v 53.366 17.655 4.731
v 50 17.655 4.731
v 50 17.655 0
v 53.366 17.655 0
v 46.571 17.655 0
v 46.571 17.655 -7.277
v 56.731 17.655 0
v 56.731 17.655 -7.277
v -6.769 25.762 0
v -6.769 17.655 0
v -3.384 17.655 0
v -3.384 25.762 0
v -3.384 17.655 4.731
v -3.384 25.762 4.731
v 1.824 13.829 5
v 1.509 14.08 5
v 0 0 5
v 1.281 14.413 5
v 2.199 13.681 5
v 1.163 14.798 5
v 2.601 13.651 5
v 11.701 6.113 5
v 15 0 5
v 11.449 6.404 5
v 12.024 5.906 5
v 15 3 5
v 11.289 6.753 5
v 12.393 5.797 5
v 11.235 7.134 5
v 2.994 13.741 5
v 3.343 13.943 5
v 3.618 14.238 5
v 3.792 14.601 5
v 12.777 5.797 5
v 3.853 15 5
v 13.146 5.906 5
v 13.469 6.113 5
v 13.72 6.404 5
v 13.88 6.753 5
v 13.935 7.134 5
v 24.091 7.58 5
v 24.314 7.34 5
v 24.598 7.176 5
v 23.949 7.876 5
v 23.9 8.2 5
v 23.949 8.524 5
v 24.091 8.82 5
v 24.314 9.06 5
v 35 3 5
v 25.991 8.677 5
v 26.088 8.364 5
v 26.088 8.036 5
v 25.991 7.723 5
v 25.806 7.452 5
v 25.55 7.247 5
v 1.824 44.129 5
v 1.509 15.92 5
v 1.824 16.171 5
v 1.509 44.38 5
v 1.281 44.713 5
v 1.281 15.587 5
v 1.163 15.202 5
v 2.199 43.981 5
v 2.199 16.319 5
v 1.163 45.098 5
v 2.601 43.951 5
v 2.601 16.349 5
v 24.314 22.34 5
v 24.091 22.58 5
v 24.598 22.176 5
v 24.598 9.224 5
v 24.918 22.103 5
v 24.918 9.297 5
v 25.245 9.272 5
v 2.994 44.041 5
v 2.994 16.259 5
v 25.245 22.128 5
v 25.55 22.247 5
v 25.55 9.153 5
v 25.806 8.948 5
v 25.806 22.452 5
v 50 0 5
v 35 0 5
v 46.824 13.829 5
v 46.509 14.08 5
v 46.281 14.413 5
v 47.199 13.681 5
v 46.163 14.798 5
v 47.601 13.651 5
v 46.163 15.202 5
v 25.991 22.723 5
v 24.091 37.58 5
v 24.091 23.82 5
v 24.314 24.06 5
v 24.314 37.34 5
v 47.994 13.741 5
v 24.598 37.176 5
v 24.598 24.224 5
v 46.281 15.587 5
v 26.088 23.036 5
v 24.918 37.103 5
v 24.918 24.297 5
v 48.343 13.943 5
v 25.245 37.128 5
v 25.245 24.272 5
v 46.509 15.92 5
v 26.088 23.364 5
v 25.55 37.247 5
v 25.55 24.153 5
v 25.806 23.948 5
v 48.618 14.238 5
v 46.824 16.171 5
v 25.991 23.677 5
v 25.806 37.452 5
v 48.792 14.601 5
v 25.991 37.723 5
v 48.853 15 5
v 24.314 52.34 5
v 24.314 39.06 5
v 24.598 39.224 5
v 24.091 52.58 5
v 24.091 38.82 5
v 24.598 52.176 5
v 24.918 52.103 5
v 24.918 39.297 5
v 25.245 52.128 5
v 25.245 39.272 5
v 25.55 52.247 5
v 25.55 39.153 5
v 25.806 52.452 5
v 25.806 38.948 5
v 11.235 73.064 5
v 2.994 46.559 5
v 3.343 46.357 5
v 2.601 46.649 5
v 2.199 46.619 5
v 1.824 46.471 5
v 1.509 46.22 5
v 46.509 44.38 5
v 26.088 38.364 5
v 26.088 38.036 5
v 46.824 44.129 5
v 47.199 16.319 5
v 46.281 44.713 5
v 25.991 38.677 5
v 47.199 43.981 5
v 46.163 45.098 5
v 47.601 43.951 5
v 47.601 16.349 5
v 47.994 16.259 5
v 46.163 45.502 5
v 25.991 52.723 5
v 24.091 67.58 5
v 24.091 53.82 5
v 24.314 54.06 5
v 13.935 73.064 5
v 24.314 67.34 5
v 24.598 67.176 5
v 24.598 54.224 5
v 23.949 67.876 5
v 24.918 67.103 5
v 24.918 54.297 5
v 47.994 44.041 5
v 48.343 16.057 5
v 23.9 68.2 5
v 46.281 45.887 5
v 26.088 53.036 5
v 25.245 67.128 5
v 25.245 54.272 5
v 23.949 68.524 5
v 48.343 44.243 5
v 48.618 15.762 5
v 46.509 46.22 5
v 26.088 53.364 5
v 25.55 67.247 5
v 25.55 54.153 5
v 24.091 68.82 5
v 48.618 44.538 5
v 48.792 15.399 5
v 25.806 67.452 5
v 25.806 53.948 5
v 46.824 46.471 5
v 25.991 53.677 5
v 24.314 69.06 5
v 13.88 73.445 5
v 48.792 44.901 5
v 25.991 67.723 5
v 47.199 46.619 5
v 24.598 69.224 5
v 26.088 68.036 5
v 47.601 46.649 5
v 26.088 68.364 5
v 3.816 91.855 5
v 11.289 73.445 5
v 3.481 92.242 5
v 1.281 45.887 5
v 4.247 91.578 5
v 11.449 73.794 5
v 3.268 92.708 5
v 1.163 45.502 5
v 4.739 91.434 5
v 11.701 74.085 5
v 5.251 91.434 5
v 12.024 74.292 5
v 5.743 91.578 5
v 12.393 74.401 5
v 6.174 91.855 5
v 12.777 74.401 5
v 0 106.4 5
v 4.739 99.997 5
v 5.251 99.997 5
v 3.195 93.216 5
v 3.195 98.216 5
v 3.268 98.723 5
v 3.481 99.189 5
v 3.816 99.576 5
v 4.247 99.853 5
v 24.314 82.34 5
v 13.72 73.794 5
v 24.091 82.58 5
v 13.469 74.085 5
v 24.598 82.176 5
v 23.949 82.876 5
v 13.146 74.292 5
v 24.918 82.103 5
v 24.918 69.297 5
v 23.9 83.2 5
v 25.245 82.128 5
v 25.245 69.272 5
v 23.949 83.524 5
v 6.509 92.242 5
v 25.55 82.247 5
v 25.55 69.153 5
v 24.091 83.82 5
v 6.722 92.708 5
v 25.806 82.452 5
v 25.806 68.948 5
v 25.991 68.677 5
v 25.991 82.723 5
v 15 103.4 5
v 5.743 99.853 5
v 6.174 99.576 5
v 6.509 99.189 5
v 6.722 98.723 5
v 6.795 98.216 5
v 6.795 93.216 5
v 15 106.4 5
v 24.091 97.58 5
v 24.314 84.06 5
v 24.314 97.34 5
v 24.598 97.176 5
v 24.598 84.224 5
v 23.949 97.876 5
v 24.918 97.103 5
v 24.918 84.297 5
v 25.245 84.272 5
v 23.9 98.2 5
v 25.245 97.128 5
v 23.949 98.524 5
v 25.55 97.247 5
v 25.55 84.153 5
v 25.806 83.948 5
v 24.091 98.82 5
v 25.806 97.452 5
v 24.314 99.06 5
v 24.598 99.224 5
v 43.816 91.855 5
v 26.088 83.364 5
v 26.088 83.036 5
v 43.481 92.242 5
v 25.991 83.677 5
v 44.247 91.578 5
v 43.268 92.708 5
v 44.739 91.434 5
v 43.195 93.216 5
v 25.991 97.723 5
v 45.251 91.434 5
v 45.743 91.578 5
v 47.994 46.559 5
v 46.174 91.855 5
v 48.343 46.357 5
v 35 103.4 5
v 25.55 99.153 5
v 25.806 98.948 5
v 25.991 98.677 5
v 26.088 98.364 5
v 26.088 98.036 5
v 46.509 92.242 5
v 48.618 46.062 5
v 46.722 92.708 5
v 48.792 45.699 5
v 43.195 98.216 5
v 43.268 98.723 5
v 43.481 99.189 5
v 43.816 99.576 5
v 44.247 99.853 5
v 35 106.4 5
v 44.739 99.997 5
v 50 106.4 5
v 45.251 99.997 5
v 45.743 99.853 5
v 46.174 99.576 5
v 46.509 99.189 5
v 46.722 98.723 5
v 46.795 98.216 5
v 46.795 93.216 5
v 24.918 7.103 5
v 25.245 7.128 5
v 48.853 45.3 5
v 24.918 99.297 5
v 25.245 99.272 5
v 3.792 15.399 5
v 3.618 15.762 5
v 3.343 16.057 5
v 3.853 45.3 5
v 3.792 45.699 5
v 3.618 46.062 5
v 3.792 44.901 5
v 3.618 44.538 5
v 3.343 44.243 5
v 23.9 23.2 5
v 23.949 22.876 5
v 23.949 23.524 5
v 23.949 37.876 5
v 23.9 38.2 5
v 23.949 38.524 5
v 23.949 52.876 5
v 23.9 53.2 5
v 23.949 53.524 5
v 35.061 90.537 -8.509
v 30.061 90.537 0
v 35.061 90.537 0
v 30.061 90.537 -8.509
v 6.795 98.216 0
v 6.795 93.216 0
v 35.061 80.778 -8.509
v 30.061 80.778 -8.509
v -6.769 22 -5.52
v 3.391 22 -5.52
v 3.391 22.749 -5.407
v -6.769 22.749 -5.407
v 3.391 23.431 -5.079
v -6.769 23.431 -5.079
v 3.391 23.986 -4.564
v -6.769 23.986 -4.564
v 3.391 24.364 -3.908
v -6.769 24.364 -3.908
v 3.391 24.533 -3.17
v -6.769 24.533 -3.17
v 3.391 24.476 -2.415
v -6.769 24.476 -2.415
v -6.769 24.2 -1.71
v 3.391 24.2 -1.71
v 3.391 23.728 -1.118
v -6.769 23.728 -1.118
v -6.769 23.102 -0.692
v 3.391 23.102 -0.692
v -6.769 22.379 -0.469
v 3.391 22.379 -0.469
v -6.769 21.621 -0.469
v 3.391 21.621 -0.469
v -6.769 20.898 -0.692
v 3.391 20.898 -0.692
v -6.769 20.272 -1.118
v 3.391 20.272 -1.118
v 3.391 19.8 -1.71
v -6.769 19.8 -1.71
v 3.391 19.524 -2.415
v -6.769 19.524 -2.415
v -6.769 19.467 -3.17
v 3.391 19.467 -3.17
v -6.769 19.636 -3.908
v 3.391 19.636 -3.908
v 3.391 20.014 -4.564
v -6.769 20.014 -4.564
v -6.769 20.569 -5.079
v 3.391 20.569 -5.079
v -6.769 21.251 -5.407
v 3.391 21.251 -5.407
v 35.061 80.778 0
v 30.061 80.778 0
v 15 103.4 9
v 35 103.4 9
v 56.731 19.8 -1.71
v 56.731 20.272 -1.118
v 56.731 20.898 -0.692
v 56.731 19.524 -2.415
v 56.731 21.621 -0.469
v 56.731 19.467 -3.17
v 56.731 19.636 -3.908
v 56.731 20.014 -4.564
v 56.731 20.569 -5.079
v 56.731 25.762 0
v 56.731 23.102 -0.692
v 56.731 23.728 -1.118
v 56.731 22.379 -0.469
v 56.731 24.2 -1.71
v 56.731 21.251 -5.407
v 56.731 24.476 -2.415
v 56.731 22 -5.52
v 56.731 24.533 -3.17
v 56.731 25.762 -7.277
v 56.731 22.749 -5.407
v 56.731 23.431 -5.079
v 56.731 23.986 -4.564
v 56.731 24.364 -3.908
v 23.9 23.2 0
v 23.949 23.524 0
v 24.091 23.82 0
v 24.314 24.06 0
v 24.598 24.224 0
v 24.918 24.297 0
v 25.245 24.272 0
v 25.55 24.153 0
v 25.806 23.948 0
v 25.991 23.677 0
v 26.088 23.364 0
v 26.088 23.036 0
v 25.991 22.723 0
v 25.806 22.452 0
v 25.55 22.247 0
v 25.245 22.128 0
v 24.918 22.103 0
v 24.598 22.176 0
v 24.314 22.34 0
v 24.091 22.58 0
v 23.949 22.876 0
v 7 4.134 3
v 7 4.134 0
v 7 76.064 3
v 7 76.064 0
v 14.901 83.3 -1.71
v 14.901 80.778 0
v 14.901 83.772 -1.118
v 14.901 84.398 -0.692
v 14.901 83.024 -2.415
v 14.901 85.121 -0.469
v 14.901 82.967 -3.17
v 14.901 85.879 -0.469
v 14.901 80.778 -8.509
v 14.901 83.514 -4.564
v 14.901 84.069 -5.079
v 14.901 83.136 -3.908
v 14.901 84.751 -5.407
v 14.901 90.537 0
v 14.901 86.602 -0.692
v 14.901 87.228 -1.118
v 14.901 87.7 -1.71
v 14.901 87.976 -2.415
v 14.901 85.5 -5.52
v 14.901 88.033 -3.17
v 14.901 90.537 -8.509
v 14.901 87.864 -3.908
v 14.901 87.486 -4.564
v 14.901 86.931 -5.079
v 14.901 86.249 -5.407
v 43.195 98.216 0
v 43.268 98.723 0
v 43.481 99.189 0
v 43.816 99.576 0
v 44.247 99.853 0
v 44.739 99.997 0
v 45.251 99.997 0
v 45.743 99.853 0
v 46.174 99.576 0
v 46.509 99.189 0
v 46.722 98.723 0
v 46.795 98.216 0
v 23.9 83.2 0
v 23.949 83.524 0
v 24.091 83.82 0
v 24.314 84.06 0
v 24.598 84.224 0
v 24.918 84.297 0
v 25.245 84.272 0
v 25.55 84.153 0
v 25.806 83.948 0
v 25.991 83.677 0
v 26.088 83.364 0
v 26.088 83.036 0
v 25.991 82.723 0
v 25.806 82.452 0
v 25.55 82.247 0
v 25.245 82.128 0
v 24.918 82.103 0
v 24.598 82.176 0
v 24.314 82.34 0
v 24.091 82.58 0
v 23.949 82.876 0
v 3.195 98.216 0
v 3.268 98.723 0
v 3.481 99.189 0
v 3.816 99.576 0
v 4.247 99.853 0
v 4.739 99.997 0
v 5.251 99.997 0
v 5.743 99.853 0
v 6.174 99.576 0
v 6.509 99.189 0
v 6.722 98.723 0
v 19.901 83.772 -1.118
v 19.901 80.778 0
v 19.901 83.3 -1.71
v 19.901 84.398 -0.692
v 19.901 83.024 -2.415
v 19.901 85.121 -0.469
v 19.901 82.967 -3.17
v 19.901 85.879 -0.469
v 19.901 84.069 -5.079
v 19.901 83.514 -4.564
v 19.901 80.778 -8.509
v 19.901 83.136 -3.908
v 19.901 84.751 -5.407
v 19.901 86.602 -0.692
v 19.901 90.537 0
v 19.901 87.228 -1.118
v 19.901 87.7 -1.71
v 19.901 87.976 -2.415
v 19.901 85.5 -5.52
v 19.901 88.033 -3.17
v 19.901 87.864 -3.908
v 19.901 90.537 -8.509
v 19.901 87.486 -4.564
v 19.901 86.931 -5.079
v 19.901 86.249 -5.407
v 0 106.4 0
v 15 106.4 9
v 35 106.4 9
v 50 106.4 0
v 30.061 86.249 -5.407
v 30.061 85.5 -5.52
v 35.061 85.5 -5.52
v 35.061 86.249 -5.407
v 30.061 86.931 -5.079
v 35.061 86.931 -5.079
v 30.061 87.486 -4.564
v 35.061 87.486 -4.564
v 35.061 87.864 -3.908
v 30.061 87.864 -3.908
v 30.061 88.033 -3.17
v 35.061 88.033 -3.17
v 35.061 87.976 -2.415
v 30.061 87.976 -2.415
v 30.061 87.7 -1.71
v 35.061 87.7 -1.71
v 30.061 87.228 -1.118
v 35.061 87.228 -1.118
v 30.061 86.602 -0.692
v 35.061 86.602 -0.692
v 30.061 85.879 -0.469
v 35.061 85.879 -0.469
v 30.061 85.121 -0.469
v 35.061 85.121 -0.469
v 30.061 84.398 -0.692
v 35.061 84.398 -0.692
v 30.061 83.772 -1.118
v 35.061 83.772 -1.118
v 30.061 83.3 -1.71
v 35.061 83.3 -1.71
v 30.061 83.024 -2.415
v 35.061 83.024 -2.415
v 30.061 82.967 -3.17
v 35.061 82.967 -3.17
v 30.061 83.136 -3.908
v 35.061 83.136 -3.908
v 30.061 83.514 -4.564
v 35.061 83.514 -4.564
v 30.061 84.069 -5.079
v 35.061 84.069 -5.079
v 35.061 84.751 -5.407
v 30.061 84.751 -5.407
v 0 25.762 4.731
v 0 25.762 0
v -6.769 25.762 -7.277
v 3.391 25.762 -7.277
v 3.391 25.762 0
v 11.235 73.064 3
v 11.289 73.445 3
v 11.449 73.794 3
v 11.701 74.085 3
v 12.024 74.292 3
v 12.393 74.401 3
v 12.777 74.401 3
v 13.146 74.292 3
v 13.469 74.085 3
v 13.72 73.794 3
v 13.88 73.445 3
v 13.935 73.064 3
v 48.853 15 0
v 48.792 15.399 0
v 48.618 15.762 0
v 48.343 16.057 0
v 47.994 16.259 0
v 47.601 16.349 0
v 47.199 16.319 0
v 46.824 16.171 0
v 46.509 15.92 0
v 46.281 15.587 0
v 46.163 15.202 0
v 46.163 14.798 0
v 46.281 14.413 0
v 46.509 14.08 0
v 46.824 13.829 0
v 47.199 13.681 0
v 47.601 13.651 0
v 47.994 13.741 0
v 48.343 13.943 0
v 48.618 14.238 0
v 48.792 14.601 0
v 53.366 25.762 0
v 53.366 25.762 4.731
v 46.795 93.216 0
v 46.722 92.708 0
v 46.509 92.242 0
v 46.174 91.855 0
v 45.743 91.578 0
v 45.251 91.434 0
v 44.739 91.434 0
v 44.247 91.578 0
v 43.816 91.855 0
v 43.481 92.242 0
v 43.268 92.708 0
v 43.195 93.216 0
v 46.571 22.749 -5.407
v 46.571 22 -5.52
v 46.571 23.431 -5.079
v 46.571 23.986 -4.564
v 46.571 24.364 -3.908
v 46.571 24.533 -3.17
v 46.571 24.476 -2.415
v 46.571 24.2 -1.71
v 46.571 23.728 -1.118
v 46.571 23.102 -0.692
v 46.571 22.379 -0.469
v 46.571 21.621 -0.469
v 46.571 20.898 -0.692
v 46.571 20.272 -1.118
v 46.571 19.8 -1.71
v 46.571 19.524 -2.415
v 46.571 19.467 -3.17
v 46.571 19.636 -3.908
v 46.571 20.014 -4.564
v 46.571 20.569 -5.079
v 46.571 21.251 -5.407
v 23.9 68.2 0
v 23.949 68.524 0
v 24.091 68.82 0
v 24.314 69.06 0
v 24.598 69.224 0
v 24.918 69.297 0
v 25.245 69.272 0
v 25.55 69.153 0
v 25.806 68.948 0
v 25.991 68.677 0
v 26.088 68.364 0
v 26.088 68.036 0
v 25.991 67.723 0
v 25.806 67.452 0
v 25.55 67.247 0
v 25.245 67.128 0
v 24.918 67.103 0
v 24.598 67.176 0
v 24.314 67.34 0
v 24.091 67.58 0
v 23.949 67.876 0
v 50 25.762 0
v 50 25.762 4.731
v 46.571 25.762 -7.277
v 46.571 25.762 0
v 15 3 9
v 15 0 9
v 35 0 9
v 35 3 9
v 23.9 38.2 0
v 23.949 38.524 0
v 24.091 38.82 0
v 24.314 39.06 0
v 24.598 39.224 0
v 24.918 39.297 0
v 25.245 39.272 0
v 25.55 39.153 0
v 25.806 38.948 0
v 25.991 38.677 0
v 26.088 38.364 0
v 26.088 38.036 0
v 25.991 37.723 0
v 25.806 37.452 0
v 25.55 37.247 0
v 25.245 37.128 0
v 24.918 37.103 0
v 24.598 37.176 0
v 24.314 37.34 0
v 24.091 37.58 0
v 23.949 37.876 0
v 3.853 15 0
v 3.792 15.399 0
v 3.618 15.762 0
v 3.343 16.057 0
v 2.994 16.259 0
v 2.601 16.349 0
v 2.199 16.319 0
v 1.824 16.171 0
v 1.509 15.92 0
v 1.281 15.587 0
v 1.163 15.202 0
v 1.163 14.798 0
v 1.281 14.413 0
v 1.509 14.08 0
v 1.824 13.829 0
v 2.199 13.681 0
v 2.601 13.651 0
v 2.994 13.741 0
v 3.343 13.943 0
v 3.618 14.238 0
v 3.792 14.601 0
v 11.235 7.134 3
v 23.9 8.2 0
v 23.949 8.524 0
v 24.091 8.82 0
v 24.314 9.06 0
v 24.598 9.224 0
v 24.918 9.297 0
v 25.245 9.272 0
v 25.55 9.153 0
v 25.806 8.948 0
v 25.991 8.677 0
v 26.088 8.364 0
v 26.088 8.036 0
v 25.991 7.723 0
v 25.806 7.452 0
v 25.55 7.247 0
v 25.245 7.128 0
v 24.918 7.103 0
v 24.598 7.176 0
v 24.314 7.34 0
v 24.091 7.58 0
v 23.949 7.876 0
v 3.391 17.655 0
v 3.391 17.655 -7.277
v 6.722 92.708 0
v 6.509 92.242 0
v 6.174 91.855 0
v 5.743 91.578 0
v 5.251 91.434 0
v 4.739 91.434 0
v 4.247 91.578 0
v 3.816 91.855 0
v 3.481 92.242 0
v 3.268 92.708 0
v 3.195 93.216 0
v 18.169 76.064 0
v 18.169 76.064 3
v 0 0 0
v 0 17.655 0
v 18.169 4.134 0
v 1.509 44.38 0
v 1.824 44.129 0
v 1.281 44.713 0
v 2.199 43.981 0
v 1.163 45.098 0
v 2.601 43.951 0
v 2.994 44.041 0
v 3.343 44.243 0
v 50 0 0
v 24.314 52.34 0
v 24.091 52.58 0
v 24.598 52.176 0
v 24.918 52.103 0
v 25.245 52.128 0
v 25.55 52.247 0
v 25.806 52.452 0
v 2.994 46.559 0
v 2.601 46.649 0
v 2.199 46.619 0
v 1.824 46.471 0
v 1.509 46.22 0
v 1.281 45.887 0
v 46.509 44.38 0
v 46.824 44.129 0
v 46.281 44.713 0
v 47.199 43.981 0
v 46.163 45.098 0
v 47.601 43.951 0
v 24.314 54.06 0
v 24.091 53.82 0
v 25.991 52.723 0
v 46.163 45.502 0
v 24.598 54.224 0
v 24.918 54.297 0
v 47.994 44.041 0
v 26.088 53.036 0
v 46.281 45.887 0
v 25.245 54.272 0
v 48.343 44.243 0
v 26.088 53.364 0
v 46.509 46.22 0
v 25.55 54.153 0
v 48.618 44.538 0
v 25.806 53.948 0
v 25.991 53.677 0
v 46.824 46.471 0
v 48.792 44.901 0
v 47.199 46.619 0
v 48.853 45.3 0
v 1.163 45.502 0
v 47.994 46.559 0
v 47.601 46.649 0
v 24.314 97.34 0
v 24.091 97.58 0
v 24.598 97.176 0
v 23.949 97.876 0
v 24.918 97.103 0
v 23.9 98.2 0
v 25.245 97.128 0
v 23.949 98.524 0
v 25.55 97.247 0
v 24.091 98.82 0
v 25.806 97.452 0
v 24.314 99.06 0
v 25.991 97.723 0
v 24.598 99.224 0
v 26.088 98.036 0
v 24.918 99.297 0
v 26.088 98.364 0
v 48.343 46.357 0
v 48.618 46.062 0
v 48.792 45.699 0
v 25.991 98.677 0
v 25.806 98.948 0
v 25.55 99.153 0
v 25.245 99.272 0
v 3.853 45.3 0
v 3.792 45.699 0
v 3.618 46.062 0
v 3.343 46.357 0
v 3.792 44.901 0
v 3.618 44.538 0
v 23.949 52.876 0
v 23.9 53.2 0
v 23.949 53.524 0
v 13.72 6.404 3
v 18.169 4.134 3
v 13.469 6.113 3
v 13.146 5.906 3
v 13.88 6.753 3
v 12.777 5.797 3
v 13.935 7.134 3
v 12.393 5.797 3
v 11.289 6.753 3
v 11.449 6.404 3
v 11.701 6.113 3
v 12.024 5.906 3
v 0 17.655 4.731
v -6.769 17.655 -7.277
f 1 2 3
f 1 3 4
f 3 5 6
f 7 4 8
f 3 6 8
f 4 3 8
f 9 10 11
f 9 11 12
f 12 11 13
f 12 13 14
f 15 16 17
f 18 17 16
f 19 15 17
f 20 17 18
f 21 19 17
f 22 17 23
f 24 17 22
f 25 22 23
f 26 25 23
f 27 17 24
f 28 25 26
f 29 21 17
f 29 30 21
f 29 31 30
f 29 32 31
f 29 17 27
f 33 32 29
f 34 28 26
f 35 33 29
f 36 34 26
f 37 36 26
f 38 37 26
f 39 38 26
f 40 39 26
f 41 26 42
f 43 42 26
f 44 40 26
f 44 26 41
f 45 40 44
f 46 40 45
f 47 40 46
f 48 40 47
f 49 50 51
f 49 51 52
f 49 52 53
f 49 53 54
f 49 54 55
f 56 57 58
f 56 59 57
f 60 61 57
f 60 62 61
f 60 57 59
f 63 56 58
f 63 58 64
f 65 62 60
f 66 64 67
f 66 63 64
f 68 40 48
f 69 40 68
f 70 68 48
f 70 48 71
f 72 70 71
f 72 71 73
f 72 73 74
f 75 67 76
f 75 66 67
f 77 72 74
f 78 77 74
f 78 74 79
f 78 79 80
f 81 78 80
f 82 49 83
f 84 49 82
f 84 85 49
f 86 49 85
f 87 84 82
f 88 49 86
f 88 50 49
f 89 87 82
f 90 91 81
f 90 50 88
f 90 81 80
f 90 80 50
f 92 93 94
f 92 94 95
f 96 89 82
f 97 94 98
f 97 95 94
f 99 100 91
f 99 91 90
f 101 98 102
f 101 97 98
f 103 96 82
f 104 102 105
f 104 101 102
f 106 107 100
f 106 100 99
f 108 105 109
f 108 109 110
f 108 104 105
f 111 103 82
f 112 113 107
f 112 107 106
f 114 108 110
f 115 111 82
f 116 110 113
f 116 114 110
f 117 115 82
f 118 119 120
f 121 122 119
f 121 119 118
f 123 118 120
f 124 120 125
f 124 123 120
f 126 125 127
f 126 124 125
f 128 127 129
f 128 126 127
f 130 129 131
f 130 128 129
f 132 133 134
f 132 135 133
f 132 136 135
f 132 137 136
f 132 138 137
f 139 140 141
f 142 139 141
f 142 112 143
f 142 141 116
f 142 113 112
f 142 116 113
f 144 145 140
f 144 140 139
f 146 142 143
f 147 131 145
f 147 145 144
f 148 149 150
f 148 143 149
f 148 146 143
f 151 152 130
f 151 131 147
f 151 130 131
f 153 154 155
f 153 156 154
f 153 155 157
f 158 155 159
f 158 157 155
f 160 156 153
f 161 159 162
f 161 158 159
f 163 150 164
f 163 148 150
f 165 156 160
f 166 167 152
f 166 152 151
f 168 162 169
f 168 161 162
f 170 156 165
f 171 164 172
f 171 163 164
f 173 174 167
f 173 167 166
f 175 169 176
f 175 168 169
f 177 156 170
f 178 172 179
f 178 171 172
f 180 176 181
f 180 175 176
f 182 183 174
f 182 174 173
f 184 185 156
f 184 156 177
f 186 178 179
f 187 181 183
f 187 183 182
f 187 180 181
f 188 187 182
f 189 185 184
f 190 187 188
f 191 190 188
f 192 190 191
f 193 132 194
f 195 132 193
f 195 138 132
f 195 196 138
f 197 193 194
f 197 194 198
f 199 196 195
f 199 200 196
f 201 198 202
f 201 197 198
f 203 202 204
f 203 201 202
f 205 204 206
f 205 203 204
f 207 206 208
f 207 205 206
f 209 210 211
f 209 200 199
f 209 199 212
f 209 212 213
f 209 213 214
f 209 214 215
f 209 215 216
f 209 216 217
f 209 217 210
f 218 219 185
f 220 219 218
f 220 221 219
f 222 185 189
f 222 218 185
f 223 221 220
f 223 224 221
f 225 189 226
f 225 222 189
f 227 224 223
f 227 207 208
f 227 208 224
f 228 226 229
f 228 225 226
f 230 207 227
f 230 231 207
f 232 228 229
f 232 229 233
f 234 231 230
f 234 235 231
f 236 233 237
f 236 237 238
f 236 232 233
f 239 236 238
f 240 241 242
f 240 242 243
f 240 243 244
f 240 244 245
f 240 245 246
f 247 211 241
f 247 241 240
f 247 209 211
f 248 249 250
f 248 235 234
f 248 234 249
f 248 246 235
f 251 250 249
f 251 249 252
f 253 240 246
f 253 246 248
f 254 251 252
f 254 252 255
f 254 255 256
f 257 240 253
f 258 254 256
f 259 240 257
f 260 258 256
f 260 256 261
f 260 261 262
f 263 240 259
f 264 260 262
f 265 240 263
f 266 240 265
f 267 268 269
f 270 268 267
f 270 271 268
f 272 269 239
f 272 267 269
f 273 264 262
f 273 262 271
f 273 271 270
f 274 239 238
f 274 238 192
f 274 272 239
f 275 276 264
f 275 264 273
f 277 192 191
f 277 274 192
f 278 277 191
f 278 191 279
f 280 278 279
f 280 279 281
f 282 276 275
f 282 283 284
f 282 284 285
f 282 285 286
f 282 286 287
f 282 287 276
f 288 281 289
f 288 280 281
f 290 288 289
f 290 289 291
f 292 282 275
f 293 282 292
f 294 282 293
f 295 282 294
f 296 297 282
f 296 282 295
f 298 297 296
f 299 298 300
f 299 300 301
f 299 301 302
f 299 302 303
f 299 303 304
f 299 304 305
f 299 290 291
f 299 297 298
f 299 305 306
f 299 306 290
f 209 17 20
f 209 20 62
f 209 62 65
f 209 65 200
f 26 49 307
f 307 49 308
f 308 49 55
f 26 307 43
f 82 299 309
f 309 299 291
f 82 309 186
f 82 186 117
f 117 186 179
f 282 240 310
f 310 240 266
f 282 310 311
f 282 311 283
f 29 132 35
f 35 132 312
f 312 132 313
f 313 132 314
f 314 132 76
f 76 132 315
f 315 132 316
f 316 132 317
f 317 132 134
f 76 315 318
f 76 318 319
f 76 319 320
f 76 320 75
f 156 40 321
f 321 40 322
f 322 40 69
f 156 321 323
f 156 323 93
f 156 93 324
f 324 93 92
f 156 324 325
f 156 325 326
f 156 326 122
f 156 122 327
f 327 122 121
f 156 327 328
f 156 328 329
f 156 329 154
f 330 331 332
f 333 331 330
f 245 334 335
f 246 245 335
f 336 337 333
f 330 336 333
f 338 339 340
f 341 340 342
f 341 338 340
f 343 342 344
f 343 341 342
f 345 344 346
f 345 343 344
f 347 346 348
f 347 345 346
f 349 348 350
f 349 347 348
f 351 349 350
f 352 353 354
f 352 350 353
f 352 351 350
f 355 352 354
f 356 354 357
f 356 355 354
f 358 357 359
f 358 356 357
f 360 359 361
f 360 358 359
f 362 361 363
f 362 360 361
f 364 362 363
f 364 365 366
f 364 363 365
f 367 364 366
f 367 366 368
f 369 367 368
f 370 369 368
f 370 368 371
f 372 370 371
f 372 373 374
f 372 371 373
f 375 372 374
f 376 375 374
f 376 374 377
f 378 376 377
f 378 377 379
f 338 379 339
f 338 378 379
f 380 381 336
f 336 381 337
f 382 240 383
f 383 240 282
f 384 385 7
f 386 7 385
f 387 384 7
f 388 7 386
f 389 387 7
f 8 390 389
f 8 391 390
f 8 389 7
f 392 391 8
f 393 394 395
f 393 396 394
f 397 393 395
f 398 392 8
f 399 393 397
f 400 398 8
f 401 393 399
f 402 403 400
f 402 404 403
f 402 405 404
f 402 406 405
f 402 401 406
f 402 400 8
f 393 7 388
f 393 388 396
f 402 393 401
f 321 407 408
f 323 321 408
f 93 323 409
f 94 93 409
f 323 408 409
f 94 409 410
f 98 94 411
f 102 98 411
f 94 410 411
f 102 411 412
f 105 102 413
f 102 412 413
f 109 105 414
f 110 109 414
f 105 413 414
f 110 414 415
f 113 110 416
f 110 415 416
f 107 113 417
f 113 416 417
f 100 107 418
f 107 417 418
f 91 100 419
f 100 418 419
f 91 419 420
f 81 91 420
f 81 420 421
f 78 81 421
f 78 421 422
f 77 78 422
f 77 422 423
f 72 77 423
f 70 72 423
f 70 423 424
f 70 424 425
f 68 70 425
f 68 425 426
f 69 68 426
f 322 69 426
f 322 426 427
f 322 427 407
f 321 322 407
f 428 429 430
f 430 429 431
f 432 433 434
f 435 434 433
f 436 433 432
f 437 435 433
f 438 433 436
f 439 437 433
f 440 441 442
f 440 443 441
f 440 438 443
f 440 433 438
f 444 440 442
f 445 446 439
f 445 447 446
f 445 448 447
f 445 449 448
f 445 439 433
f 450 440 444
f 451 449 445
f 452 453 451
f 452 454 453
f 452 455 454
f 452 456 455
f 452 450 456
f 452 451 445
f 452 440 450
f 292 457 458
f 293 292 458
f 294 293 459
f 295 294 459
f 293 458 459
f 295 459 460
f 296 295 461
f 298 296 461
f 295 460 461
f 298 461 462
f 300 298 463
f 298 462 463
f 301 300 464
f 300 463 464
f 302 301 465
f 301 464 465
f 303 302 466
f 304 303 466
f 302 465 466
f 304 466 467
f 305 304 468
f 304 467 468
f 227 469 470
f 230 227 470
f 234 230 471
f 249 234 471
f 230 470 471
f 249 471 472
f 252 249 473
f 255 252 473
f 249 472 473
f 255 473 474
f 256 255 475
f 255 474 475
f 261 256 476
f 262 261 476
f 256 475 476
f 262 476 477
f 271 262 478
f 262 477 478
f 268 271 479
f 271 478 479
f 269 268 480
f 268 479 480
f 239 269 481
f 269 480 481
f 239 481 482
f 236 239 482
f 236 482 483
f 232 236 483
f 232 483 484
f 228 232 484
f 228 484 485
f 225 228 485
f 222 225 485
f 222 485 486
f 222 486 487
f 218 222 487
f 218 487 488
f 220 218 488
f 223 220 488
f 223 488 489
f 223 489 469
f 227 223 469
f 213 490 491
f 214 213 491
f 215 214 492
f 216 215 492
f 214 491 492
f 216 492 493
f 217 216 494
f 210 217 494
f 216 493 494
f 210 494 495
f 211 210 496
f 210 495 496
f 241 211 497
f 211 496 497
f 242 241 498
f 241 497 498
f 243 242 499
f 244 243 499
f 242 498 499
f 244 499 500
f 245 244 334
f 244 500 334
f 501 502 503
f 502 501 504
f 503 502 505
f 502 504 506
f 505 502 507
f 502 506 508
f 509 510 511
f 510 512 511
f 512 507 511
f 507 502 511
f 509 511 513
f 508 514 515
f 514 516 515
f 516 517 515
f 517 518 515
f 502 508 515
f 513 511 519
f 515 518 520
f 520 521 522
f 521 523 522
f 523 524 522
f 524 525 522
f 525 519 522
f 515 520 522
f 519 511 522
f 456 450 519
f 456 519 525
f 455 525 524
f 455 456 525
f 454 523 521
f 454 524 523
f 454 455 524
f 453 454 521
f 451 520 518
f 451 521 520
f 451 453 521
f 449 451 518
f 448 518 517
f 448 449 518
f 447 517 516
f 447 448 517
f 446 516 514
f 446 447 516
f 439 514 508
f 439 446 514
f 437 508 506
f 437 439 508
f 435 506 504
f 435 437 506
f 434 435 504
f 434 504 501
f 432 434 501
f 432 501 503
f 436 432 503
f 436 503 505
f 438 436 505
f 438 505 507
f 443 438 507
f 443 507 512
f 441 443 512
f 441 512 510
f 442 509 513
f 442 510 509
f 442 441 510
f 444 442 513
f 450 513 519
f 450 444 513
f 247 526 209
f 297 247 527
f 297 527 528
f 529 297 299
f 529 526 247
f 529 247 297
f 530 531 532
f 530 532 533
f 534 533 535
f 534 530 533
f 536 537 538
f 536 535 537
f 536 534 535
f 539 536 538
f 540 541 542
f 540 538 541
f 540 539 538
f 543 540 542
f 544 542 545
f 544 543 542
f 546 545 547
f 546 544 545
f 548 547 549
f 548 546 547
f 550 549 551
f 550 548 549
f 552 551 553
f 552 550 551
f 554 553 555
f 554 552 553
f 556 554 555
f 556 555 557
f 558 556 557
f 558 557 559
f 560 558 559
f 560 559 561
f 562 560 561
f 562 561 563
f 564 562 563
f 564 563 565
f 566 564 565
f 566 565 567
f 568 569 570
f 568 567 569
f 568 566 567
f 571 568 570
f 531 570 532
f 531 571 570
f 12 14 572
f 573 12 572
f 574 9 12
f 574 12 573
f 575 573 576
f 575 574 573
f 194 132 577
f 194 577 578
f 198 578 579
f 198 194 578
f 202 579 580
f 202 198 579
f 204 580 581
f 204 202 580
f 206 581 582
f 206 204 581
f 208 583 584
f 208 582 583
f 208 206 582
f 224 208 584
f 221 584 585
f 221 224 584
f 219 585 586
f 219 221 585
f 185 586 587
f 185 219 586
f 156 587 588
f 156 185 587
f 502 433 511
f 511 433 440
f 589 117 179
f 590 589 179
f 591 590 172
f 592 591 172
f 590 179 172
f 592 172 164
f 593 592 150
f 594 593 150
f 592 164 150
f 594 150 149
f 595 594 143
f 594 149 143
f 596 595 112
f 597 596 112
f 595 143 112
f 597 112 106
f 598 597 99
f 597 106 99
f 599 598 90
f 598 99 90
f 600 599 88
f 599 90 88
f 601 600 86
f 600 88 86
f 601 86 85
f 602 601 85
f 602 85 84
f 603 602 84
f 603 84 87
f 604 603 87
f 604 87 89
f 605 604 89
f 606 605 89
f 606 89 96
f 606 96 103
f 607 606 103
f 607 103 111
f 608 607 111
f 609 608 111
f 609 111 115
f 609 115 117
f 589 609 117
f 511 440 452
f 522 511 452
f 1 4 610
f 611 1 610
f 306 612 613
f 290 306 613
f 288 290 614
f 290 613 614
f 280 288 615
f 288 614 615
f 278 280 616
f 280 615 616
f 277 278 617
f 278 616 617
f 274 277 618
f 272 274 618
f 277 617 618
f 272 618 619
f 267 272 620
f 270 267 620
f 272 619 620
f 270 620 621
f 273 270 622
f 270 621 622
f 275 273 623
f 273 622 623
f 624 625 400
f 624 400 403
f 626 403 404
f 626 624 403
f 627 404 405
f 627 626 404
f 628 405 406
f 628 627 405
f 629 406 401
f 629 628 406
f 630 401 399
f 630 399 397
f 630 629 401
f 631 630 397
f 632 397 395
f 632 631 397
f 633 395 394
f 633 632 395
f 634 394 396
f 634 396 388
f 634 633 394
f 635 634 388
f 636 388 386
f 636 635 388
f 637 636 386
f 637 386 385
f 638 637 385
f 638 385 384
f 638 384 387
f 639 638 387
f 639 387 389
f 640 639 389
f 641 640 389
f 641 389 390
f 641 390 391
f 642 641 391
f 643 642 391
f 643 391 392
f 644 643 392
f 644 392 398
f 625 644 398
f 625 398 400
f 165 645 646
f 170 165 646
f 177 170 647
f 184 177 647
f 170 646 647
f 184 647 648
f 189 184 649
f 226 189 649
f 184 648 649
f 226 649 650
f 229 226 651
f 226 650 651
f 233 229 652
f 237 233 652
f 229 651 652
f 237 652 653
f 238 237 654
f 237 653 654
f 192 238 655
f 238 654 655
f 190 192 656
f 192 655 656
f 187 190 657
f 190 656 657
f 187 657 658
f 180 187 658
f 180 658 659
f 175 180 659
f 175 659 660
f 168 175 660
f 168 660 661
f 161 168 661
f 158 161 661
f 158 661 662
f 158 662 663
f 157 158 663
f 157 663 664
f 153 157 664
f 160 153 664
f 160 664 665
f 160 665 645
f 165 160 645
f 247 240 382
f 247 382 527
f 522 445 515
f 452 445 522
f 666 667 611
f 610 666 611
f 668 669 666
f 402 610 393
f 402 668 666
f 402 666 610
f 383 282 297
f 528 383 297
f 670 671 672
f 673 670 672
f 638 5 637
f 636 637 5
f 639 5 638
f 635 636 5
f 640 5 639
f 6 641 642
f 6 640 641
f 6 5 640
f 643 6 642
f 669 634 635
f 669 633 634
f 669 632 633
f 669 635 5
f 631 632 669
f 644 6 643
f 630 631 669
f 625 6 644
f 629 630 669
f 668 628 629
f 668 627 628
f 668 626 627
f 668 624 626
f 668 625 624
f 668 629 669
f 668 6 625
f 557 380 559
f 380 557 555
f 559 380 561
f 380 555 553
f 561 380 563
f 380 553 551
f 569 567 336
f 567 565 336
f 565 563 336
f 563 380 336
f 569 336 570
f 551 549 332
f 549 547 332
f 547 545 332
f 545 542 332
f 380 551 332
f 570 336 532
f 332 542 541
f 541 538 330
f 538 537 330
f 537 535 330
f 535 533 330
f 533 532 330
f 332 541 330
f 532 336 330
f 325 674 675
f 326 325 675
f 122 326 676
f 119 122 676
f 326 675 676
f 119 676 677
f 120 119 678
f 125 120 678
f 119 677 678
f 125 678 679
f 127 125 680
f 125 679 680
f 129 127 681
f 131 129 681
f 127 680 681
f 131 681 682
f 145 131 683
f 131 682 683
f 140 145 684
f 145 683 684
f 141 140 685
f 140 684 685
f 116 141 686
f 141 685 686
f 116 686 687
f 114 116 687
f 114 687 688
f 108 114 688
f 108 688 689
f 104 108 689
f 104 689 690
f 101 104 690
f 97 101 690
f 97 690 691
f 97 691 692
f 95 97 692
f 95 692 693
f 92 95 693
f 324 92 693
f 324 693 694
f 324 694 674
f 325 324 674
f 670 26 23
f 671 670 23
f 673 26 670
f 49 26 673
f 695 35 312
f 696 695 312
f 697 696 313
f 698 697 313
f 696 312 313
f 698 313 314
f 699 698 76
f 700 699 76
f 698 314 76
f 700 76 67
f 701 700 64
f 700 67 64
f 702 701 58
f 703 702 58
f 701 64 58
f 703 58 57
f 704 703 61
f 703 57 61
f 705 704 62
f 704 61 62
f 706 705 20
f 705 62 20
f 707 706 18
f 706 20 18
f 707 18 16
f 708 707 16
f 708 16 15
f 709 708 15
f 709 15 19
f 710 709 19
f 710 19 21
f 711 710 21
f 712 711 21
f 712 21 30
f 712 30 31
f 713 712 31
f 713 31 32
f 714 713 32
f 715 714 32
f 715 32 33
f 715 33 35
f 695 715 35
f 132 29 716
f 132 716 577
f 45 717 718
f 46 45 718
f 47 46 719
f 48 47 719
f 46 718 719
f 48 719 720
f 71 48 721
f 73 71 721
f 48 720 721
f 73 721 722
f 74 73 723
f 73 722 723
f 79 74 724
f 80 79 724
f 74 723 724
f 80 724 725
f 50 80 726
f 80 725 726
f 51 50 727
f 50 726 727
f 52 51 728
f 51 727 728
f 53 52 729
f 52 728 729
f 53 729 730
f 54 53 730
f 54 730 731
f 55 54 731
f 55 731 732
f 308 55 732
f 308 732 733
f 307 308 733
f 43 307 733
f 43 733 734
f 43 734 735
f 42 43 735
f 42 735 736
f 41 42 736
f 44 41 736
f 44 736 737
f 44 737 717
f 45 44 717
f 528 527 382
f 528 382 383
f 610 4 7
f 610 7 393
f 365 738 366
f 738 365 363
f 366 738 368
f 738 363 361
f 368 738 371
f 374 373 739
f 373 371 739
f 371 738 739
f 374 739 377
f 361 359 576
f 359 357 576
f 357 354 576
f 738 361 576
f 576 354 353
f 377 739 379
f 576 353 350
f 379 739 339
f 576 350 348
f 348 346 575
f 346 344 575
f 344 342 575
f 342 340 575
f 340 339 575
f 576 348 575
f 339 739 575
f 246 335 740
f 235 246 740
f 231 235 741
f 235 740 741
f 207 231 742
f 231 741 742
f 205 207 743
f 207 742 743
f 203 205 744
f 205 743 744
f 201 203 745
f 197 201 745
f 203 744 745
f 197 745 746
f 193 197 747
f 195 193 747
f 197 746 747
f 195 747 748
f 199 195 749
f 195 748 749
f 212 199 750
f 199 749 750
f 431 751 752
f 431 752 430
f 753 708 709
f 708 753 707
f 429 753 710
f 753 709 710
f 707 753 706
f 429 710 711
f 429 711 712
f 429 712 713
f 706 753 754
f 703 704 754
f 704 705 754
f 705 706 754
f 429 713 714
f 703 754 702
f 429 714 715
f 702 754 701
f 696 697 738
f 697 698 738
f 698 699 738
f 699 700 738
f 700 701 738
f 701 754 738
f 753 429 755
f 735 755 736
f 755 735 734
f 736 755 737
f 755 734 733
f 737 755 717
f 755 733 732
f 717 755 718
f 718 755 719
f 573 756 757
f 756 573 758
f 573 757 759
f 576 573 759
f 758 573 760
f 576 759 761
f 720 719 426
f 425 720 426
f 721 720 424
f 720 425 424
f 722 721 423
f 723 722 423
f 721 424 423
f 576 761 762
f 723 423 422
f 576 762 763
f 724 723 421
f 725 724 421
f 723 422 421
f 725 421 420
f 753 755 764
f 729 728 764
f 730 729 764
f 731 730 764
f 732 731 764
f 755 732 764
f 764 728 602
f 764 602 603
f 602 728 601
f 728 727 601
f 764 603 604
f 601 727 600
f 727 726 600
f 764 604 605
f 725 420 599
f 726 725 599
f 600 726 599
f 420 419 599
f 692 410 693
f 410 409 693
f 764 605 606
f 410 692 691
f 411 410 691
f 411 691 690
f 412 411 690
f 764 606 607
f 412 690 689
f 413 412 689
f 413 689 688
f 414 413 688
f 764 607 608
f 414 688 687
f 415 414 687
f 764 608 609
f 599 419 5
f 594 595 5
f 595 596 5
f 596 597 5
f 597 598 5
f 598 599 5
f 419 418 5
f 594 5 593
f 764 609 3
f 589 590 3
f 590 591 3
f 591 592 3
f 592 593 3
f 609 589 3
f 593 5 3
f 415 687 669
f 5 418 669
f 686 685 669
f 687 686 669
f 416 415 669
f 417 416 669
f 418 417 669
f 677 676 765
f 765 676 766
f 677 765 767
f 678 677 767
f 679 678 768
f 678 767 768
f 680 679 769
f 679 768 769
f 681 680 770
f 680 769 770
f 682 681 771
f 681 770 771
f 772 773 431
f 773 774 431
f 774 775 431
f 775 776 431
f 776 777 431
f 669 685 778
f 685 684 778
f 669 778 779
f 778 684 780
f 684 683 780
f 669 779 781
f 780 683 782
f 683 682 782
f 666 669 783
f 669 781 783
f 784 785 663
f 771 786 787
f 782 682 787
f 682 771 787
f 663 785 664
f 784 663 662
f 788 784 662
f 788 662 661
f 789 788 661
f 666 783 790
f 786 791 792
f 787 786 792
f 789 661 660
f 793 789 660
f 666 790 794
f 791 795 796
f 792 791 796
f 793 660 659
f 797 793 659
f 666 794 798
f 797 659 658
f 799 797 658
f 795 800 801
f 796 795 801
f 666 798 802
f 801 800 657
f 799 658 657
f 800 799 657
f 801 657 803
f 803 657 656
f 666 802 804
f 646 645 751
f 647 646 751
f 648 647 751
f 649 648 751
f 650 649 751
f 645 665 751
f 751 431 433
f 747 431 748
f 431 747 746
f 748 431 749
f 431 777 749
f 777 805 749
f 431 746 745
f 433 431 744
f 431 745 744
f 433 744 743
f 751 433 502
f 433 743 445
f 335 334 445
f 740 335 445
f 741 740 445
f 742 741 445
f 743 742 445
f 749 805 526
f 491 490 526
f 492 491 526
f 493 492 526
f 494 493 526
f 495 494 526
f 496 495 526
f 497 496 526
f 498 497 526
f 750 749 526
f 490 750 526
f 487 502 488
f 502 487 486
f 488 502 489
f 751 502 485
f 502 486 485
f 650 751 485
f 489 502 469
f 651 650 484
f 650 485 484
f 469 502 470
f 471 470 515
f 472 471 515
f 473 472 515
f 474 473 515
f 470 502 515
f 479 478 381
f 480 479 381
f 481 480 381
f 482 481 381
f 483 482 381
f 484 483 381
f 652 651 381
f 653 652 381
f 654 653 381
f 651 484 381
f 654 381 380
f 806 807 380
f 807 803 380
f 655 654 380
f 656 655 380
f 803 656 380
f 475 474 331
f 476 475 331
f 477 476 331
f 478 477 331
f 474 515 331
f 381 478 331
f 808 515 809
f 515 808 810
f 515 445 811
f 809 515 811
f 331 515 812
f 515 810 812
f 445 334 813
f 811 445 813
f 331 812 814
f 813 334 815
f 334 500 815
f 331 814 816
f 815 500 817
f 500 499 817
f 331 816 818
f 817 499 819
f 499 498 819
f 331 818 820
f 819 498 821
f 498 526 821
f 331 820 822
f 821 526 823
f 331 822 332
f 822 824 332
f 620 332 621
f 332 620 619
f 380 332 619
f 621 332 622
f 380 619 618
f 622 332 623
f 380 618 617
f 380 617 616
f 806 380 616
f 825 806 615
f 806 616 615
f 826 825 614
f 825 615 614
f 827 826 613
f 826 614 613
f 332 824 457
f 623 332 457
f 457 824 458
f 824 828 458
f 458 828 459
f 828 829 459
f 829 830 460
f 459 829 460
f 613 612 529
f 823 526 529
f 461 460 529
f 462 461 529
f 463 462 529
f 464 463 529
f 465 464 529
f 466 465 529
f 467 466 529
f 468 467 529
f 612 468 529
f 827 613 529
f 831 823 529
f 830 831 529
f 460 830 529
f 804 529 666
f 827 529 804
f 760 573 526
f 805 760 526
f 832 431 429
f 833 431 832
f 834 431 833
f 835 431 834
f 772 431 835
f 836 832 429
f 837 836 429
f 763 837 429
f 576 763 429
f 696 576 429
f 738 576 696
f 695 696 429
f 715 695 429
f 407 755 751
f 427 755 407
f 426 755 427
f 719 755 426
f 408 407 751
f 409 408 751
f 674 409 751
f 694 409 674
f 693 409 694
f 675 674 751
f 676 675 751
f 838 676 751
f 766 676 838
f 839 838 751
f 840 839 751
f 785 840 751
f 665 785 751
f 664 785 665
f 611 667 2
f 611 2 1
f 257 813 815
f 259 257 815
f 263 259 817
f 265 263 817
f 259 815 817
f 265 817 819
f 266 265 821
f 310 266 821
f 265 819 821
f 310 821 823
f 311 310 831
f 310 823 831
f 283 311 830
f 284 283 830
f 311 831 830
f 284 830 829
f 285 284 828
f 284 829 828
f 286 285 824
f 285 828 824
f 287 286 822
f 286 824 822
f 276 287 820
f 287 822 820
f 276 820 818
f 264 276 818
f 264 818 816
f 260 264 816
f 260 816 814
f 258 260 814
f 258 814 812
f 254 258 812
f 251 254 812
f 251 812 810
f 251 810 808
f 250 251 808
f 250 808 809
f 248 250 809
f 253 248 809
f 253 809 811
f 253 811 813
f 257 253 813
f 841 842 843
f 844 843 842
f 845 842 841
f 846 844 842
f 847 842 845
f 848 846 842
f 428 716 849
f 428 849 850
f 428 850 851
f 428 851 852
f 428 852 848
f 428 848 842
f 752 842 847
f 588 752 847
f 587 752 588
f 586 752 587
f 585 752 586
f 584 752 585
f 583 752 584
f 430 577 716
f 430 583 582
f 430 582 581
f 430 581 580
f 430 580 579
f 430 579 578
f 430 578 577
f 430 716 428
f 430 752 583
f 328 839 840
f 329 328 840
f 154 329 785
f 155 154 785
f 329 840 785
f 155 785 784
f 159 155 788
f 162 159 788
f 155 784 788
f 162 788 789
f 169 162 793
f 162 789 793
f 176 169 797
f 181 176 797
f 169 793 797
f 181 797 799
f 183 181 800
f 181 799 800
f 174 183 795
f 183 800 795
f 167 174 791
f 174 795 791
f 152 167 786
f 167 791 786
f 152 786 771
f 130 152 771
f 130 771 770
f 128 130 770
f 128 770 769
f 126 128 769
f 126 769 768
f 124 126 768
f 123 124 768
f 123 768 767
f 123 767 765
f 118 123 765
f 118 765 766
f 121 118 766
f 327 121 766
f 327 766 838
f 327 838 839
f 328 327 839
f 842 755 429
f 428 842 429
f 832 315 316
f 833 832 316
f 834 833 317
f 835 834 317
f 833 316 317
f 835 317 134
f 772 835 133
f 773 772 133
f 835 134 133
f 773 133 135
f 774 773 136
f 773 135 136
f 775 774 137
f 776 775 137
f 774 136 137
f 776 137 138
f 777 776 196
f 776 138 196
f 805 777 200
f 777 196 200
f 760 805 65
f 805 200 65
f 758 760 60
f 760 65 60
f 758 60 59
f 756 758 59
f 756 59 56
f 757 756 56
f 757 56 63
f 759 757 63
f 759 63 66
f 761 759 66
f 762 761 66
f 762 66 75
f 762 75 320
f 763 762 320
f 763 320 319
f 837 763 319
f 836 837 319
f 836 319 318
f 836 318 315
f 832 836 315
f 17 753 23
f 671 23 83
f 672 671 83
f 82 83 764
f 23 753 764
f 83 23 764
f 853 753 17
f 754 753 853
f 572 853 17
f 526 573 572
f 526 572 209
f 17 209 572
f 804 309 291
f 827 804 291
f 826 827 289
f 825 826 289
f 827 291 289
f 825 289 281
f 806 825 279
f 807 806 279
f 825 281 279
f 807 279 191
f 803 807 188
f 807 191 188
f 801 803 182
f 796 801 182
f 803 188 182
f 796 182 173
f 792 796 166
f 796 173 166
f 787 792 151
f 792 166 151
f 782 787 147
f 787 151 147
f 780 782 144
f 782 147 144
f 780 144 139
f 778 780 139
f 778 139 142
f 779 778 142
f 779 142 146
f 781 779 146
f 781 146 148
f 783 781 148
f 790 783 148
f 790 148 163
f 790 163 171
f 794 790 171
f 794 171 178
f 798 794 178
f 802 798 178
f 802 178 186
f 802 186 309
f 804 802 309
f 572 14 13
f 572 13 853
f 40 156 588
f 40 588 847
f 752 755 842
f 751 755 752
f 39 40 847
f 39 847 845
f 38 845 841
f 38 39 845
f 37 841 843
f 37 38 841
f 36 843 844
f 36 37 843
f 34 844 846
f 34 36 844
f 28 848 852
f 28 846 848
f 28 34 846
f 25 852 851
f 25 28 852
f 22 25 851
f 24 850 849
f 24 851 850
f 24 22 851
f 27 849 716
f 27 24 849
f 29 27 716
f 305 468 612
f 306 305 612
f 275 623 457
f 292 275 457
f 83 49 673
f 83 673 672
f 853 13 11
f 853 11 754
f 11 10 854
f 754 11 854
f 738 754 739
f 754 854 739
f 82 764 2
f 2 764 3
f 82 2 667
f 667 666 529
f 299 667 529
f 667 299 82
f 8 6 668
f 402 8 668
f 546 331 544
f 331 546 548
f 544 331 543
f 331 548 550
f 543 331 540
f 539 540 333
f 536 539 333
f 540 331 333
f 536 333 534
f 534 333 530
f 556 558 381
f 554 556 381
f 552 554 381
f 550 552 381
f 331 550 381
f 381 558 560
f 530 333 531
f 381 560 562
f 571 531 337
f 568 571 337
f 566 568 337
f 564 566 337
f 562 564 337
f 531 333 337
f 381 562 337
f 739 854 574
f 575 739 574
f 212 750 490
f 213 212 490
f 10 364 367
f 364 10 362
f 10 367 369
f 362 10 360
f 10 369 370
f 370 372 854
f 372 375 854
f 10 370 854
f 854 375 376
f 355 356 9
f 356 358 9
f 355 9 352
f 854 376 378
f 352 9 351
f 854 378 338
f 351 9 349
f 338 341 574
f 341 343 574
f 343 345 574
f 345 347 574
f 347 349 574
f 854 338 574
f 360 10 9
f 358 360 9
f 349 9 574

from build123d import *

# Parameters (mm, degrees)
SKETCH1_W                   = 50
SKETCH1_H                   = 106.4
BOSS_EXTRUDE1_DEPTH         = 5
SKETCH2_W                   = 20
SKETCH2_H                   = 3
BOSS_EXTRUDE2_DEPTH         = 4
TAP_DRILL_FOR_M2X0_4_TAP1_D = 2.2
LPATTERN1_COUNT             = 4
LPATTERN1_PITCH             = 15
LPATTERN1_COL_COUNT         = 4
LPATTERN1_COL_PITCH         = 15
CUT_EXTRUDE1_DEPTH          = 118.668857392
SKETCH7_W                   = 11.1694
SKETCH7_H                   = 71.9308
CUT_EXTRUDE2_DEPTH          = 3
F_2_CLEARANCE_HOLE1_D       = 2.7051
SKETCH11_R                  = 1.8
CUT_EXTRUDE3_DEPTH          = 118.906573184
BOSS_EXTRUDE5_DEPTH         = 6.731
BOSS_EXTRUDE5_DEPTH_BACK    = 56.769
SKETCH14_W                  = 7.277473249
SKETCH14_H                  = 8.107504071
SKETCH14_R                  = 2.54
SKETCH14_W_2                = 8.508813203
SKETCH14_H_2                = 9.759110034
SKETCH15_W                  = 3.3655
SKETCH15_H                  = 8.107504071
SKETCH15_W_2                = 3.3845
BOSS_EXTRUDE6_DEPTH         = 4.731
CUT_EXTRUDE4_REACH          = 123.844
SKETCH16_W                  = 43.18
SKETCH16_H                  = 8.107504071
SKETCH16_W_2                = 21.67
SKETCH16_H_2                = 9.759110034


with BuildPart() as part:
    # Sketch1 → Boss-Extrude1 (new body)
    with BuildSketch(Plane.XY):
        with Locations((25, 53.2)):
            Rectangle(SKETCH1_W, SKETCH1_H)
    extrude(amount=BOSS_EXTRUDE1_DEPTH)

    # Sketch2 → Boss-Extrude2 (add)
    with BuildSketch(Plane.XY.offset(5)):
        with Locations((25, 104.9)):
            Rectangle(SKETCH2_W, SKETCH2_H)
    boss_extrude2 = extrude(amount=BOSS_EXTRUDE2_DEPTH)

    # Mirror1: Boss-Extrude2 across plane
    add(boss_extrude2.mirror(Plane.ZX.offset(53.2)))

    # Tap Drill for M2x0.4 Tap1 (through all)
    with Locations(Plane.XY.offset(5)):
        with Locations((25, 53.2)):
            tap_drill_for_m2x0_4_tap1 = Hole(TAP_DRILL_FOR_M2X0_4_TAP1_D / 2)

    # LPattern1: Tap Drill for M2x0.4 Tap1 ×4
    with Locations(*[(0, -i * LPATTERN1_PITCH, 0) for i in range(1, LPATTERN1_COUNT)]):
        add(tap_drill_for_m2x0_4_tap1, mode=Mode.SUBTRACT)

    # LPattern1 col: Tap Drill for M2x0.4 Tap1 ×4
    with Locations(*[(0, i * LPATTERN1_COL_PITCH, 0) for i in range(1, LPATTERN1_COL_COUNT)]):
        add(tap_drill_for_m2x0_4_tap1, mode=Mode.SUBTRACT)

    # Sketch6 → Cut-Extrude1 (cut, through all)
    with BuildSketch(Plane.XY.offset(5)):
        with BuildLine():
            Line((11.2347, 7.1336), (11.2347, 73.0644))
            ThreePointArc((11.2347, 73.0644), (12.5847, 74.4144), (13.9347, 73.0644))
            Line((13.9347, 73.0644), (13.9347, 7.1336))
            ThreePointArc((13.9347, 7.1336), (12.5847, 5.7836), (11.2347, 7.1336))
        make_face()
    extrude(amount=-CUT_EXTRUDE1_DEPTH, mode=Mode.SUBTRACT)

    # Sketch7 → Cut-Extrude2 (cut)
    with BuildSketch(Plane(origin=(0, 0, 0), x_dir=(-1, 0, 0), z_dir=(0, 0, -1))):
        with Locations((-12.5847, 40.099)):
            Rectangle(SKETCH7_W, SKETCH7_H)
    extrude(amount=-CUT_EXTRUDE2_DEPTH, mode=Mode.SUBTRACT)

    # #2 Clearance Hole1 (through all)
    with Locations(Plane(origin=(0, 0, 0), x_dir=(-1, 0, 0), z_dir=(0, 0, -1))):
        with Locations((-47.5, 45.3), (-2.5, 45.3), (-2.5, 15), (-47.5, 15)):
            Hole(F_2_CLEARANCE_HOLE1_D / 2)

    # Sketch11 → Cut-Extrude3 (cut, through all)
    with BuildSketch(Plane(origin=(0, 0, 0), x_dir=(-1, 0, 0), z_dir=(0, 0, -1))):
        with BuildLine():
            Line((-46.795, 98.2156), (-46.795, 95.7156))
            ThreePointArc((-46.795, 95.7156), (-44.995, 97.5156), (-43.195, 95.7156))
            Line((-43.195, 95.7156), (-43.195, 98.2156))
            ThreePointArc((-43.195, 98.2156), (-44.995, 100.0156), (-46.795, 98.2156))
        make_face()
        with Locations((-44.995, 95.7156)):
            Circle(SKETCH11_R)
        with BuildLine():
            Line((-46.795, 95.7156), (-46.795, 93.2156))
            ThreePointArc((-46.795, 93.2156), (-44.995, 91.4156), (-43.195, 93.2156))
            Line((-43.195, 93.2156), (-43.195, 95.7156))
            ThreePointArc((-43.195, 95.7156), (-44.995, 93.9156), (-46.795, 95.7156))
        make_face()
        with BuildLine():
            Line((-6.795, 98.2156), (-6.795, 95.715599993))
            ThreePointArc((-6.795, 95.715599993), (-4.995000003, 97.5156), (-3.195, 95.7156))
            Line((-3.195, 95.7156), (-3.195, 98.2156))
            ThreePointArc((-3.195, 98.2156), (-4.995, 100.0156), (-6.795, 98.2156))
        make_face()
        with Locations((-4.995, 95.7156)):
            Circle(SKETCH11_R)
        with BuildLine():
            Line((-6.795, 95.715599993), (-6.795, 93.2156))
            ThreePointArc((-6.795, 93.2156), (-4.995, 91.4156), (-3.195, 93.2156))
            Line((-3.195, 93.2156), (-3.195, 95.7156))
            ThreePointArc((-3.195, 95.7156), (-4.994999997, 93.9156), (-6.795, 95.715599993))
        make_face()
    extrude(amount=-CUT_EXTRUDE3_DEPTH, mode=Mode.SUBTRACT)

    # Sketch14 → Boss-Extrude5 (add, two sides: drawn at the far end of the back side and taken through both)
    # profile 1 of 2: a face of its own
    with BuildSketch(Plane(origin=(50, 0, 0), x_dir=(0, 0, -1), z_dir=(1, 0, 0)).offset(-BOSS_EXTRUDE5_DEPTH_BACK)):
        with Locations((3.638736625, 21.708366631)):
            Rectangle(SKETCH14_W, SKETCH14_H)
        with Locations((2.980230777, 22)):
            Circle(SKETCH14_R, mode=Mode.SUBTRACT)
    # profile 2 of 2: a face of its own
    with BuildSketch(Plane(origin=(50, 0, 0), x_dir=(0, 0, -1), z_dir=(1, 0, 0)).offset(-BOSS_EXTRUDE5_DEPTH_BACK)):
        with Locations((4.254406602, 85.657429776)):
            Rectangle(SKETCH14_W_2, SKETCH14_H_2)
        with Locations((2.980230777, 85.5)):
            Circle(SKETCH14_R, mode=Mode.SUBTRACT)
    extrude(amount=BOSS_EXTRUDE5_DEPTH + BOSS_EXTRUDE5_DEPTH_BACK)

    # Sketch15 → Boss-Extrude6 (add)
    with BuildSketch(Plane.XY):
        with Locations((51.68275, 21.708366631)):
            Rectangle(SKETCH15_W, SKETCH15_H)
        with Locations((-1.69225, 21.708366631)):
            Rectangle(SKETCH15_W_2, SKETCH15_H)
    extrude(amount=BOSS_EXTRUDE6_DEPTH)

    # Cut-Extrude4: up to this face of the body (flat: up to its plane)
    cut_extrude4_end = Plane(part.part.faces().sort_by_distance((28.220383902, 53.923969289, 0))[0])
    # Sketch16 → Cut-Extrude4 (cut, up to the picked face)
    with BuildSketch(Plane(origin=(0, 0, -8.508813203), x_dir=(-1, 0, 0), z_dir=(0, 0, -1)), mode=Mode.PRIVATE) as cut_extrude4_sk1:
        with Locations((-24.981, 21.708366631)):
            Rectangle(SKETCH16_W, SKETCH16_H)
    cut_extrude4_tool1 = split(extrude(cut_extrude4_sk1.sketch, amount=-CUT_EXTRUDE4_REACH, mode=Mode.PRIVATE), bisect_by=cut_extrude4_end, keep=Keep.BOTH, mode=Mode.PRIVATE)
    # Sketch16 → Cut-Extrude4 (cut, up to the picked face)
    with BuildSketch(Plane(origin=(0, 0, -8.508813203), x_dir=(-1, 0, 0), z_dir=(0, 0, -1)), mode=Mode.PRIVATE) as cut_extrude4_sk2:
        Polygon((-19.901, 80.777874759), (-30.061, 90.536984793), (-30.061, 80.777874759), align=None)
    cut_extrude4_tool2 = split(extrude(cut_extrude4_sk2.sketch, amount=-CUT_EXTRUDE4_REACH, mode=Mode.PRIVATE), bisect_by=cut_extrude4_end, keep=Keep.BOTH, mode=Mode.PRIVATE)
    # Sketch16 → Cut-Extrude4 (cut, up to the picked face)
    with BuildSketch(Plane(origin=(0, 0, -8.508813203), x_dir=(-1, 0, 0), z_dir=(0, 0, -1)), mode=Mode.PRIVATE) as cut_extrude4_sk3:
        Polygon((-19.901, 90.536984793), (-30.061, 90.536984793), (-19.901, 80.777874759), align=None)
    cut_extrude4_tool3 = split(extrude(cut_extrude4_sk3.sketch, amount=-CUT_EXTRUDE4_REACH, mode=Mode.PRIVATE), bisect_by=cut_extrude4_end, keep=Keep.BOTH, mode=Mode.PRIVATE)
    # Sketch16 → Cut-Extrude4 (cut, up to the picked face)
    with BuildSketch(Plane(origin=(0, 0, -8.508813203), x_dir=(-1, 0, 0), z_dir=(0, 0, -1)), mode=Mode.PRIVATE) as cut_extrude4_sk4:
        with Locations((-45.896, 85.657429776)):
            Rectangle(SKETCH16_W_2, SKETCH16_H_2)
    cut_extrude4_tool4 = split(extrude(cut_extrude4_sk4.sketch, amount=-CUT_EXTRUDE4_REACH, mode=Mode.PRIVATE), bisect_by=cut_extrude4_end, keep=Keep.BOTH, mode=Mode.PRIVATE)
    # Sketch16 → Cut-Extrude4 (cut, up to the picked face)
    with BuildSketch(Plane(origin=(0, 0, -8.508813203), x_dir=(-1, 0, 0), z_dir=(0, 0, -1)), mode=Mode.PRIVATE) as cut_extrude4_sk5:
        with Locations((-4.066, 85.657429776)):
            Rectangle(SKETCH16_W_2, SKETCH16_H_2)
    cut_extrude4_tool5 = split(extrude(cut_extrude4_sk5.sketch, amount=-CUT_EXTRUDE4_REACH, mode=Mode.PRIVATE), bisect_by=cut_extrude4_end, keep=Keep.BOTH, mode=Mode.PRIVATE)
    add(cut_extrude4_tool1.solids().sort_by(Axis((24.981, 21.708367, -8.508813), (0, 0, 1)))[0], mode=Mode.SUBTRACT)
    add(cut_extrude4_tool2.solids().sort_by(Axis((26.674333, 84.030911, -8.508813), (0, 0, 1)))[0], mode=Mode.SUBTRACT)
    add(cut_extrude4_tool3.solids().sort_by(Axis((23.287667, 87.283948, -8.508813), (0, 0, 1)))[0], mode=Mode.SUBTRACT)
    add(cut_extrude4_tool4.solids().sort_by(Axis((45.896, 85.65743, -8.508813), (0, 0, 1)))[0], mode=Mode.SUBTRACT)
    add(cut_extrude4_tool5.solids().sort_by(Axis((4.066, 85.65743, -8.508813), (0, 0, 1)))[0], mode=Mode.SUBTRACT)


solid = part.part
